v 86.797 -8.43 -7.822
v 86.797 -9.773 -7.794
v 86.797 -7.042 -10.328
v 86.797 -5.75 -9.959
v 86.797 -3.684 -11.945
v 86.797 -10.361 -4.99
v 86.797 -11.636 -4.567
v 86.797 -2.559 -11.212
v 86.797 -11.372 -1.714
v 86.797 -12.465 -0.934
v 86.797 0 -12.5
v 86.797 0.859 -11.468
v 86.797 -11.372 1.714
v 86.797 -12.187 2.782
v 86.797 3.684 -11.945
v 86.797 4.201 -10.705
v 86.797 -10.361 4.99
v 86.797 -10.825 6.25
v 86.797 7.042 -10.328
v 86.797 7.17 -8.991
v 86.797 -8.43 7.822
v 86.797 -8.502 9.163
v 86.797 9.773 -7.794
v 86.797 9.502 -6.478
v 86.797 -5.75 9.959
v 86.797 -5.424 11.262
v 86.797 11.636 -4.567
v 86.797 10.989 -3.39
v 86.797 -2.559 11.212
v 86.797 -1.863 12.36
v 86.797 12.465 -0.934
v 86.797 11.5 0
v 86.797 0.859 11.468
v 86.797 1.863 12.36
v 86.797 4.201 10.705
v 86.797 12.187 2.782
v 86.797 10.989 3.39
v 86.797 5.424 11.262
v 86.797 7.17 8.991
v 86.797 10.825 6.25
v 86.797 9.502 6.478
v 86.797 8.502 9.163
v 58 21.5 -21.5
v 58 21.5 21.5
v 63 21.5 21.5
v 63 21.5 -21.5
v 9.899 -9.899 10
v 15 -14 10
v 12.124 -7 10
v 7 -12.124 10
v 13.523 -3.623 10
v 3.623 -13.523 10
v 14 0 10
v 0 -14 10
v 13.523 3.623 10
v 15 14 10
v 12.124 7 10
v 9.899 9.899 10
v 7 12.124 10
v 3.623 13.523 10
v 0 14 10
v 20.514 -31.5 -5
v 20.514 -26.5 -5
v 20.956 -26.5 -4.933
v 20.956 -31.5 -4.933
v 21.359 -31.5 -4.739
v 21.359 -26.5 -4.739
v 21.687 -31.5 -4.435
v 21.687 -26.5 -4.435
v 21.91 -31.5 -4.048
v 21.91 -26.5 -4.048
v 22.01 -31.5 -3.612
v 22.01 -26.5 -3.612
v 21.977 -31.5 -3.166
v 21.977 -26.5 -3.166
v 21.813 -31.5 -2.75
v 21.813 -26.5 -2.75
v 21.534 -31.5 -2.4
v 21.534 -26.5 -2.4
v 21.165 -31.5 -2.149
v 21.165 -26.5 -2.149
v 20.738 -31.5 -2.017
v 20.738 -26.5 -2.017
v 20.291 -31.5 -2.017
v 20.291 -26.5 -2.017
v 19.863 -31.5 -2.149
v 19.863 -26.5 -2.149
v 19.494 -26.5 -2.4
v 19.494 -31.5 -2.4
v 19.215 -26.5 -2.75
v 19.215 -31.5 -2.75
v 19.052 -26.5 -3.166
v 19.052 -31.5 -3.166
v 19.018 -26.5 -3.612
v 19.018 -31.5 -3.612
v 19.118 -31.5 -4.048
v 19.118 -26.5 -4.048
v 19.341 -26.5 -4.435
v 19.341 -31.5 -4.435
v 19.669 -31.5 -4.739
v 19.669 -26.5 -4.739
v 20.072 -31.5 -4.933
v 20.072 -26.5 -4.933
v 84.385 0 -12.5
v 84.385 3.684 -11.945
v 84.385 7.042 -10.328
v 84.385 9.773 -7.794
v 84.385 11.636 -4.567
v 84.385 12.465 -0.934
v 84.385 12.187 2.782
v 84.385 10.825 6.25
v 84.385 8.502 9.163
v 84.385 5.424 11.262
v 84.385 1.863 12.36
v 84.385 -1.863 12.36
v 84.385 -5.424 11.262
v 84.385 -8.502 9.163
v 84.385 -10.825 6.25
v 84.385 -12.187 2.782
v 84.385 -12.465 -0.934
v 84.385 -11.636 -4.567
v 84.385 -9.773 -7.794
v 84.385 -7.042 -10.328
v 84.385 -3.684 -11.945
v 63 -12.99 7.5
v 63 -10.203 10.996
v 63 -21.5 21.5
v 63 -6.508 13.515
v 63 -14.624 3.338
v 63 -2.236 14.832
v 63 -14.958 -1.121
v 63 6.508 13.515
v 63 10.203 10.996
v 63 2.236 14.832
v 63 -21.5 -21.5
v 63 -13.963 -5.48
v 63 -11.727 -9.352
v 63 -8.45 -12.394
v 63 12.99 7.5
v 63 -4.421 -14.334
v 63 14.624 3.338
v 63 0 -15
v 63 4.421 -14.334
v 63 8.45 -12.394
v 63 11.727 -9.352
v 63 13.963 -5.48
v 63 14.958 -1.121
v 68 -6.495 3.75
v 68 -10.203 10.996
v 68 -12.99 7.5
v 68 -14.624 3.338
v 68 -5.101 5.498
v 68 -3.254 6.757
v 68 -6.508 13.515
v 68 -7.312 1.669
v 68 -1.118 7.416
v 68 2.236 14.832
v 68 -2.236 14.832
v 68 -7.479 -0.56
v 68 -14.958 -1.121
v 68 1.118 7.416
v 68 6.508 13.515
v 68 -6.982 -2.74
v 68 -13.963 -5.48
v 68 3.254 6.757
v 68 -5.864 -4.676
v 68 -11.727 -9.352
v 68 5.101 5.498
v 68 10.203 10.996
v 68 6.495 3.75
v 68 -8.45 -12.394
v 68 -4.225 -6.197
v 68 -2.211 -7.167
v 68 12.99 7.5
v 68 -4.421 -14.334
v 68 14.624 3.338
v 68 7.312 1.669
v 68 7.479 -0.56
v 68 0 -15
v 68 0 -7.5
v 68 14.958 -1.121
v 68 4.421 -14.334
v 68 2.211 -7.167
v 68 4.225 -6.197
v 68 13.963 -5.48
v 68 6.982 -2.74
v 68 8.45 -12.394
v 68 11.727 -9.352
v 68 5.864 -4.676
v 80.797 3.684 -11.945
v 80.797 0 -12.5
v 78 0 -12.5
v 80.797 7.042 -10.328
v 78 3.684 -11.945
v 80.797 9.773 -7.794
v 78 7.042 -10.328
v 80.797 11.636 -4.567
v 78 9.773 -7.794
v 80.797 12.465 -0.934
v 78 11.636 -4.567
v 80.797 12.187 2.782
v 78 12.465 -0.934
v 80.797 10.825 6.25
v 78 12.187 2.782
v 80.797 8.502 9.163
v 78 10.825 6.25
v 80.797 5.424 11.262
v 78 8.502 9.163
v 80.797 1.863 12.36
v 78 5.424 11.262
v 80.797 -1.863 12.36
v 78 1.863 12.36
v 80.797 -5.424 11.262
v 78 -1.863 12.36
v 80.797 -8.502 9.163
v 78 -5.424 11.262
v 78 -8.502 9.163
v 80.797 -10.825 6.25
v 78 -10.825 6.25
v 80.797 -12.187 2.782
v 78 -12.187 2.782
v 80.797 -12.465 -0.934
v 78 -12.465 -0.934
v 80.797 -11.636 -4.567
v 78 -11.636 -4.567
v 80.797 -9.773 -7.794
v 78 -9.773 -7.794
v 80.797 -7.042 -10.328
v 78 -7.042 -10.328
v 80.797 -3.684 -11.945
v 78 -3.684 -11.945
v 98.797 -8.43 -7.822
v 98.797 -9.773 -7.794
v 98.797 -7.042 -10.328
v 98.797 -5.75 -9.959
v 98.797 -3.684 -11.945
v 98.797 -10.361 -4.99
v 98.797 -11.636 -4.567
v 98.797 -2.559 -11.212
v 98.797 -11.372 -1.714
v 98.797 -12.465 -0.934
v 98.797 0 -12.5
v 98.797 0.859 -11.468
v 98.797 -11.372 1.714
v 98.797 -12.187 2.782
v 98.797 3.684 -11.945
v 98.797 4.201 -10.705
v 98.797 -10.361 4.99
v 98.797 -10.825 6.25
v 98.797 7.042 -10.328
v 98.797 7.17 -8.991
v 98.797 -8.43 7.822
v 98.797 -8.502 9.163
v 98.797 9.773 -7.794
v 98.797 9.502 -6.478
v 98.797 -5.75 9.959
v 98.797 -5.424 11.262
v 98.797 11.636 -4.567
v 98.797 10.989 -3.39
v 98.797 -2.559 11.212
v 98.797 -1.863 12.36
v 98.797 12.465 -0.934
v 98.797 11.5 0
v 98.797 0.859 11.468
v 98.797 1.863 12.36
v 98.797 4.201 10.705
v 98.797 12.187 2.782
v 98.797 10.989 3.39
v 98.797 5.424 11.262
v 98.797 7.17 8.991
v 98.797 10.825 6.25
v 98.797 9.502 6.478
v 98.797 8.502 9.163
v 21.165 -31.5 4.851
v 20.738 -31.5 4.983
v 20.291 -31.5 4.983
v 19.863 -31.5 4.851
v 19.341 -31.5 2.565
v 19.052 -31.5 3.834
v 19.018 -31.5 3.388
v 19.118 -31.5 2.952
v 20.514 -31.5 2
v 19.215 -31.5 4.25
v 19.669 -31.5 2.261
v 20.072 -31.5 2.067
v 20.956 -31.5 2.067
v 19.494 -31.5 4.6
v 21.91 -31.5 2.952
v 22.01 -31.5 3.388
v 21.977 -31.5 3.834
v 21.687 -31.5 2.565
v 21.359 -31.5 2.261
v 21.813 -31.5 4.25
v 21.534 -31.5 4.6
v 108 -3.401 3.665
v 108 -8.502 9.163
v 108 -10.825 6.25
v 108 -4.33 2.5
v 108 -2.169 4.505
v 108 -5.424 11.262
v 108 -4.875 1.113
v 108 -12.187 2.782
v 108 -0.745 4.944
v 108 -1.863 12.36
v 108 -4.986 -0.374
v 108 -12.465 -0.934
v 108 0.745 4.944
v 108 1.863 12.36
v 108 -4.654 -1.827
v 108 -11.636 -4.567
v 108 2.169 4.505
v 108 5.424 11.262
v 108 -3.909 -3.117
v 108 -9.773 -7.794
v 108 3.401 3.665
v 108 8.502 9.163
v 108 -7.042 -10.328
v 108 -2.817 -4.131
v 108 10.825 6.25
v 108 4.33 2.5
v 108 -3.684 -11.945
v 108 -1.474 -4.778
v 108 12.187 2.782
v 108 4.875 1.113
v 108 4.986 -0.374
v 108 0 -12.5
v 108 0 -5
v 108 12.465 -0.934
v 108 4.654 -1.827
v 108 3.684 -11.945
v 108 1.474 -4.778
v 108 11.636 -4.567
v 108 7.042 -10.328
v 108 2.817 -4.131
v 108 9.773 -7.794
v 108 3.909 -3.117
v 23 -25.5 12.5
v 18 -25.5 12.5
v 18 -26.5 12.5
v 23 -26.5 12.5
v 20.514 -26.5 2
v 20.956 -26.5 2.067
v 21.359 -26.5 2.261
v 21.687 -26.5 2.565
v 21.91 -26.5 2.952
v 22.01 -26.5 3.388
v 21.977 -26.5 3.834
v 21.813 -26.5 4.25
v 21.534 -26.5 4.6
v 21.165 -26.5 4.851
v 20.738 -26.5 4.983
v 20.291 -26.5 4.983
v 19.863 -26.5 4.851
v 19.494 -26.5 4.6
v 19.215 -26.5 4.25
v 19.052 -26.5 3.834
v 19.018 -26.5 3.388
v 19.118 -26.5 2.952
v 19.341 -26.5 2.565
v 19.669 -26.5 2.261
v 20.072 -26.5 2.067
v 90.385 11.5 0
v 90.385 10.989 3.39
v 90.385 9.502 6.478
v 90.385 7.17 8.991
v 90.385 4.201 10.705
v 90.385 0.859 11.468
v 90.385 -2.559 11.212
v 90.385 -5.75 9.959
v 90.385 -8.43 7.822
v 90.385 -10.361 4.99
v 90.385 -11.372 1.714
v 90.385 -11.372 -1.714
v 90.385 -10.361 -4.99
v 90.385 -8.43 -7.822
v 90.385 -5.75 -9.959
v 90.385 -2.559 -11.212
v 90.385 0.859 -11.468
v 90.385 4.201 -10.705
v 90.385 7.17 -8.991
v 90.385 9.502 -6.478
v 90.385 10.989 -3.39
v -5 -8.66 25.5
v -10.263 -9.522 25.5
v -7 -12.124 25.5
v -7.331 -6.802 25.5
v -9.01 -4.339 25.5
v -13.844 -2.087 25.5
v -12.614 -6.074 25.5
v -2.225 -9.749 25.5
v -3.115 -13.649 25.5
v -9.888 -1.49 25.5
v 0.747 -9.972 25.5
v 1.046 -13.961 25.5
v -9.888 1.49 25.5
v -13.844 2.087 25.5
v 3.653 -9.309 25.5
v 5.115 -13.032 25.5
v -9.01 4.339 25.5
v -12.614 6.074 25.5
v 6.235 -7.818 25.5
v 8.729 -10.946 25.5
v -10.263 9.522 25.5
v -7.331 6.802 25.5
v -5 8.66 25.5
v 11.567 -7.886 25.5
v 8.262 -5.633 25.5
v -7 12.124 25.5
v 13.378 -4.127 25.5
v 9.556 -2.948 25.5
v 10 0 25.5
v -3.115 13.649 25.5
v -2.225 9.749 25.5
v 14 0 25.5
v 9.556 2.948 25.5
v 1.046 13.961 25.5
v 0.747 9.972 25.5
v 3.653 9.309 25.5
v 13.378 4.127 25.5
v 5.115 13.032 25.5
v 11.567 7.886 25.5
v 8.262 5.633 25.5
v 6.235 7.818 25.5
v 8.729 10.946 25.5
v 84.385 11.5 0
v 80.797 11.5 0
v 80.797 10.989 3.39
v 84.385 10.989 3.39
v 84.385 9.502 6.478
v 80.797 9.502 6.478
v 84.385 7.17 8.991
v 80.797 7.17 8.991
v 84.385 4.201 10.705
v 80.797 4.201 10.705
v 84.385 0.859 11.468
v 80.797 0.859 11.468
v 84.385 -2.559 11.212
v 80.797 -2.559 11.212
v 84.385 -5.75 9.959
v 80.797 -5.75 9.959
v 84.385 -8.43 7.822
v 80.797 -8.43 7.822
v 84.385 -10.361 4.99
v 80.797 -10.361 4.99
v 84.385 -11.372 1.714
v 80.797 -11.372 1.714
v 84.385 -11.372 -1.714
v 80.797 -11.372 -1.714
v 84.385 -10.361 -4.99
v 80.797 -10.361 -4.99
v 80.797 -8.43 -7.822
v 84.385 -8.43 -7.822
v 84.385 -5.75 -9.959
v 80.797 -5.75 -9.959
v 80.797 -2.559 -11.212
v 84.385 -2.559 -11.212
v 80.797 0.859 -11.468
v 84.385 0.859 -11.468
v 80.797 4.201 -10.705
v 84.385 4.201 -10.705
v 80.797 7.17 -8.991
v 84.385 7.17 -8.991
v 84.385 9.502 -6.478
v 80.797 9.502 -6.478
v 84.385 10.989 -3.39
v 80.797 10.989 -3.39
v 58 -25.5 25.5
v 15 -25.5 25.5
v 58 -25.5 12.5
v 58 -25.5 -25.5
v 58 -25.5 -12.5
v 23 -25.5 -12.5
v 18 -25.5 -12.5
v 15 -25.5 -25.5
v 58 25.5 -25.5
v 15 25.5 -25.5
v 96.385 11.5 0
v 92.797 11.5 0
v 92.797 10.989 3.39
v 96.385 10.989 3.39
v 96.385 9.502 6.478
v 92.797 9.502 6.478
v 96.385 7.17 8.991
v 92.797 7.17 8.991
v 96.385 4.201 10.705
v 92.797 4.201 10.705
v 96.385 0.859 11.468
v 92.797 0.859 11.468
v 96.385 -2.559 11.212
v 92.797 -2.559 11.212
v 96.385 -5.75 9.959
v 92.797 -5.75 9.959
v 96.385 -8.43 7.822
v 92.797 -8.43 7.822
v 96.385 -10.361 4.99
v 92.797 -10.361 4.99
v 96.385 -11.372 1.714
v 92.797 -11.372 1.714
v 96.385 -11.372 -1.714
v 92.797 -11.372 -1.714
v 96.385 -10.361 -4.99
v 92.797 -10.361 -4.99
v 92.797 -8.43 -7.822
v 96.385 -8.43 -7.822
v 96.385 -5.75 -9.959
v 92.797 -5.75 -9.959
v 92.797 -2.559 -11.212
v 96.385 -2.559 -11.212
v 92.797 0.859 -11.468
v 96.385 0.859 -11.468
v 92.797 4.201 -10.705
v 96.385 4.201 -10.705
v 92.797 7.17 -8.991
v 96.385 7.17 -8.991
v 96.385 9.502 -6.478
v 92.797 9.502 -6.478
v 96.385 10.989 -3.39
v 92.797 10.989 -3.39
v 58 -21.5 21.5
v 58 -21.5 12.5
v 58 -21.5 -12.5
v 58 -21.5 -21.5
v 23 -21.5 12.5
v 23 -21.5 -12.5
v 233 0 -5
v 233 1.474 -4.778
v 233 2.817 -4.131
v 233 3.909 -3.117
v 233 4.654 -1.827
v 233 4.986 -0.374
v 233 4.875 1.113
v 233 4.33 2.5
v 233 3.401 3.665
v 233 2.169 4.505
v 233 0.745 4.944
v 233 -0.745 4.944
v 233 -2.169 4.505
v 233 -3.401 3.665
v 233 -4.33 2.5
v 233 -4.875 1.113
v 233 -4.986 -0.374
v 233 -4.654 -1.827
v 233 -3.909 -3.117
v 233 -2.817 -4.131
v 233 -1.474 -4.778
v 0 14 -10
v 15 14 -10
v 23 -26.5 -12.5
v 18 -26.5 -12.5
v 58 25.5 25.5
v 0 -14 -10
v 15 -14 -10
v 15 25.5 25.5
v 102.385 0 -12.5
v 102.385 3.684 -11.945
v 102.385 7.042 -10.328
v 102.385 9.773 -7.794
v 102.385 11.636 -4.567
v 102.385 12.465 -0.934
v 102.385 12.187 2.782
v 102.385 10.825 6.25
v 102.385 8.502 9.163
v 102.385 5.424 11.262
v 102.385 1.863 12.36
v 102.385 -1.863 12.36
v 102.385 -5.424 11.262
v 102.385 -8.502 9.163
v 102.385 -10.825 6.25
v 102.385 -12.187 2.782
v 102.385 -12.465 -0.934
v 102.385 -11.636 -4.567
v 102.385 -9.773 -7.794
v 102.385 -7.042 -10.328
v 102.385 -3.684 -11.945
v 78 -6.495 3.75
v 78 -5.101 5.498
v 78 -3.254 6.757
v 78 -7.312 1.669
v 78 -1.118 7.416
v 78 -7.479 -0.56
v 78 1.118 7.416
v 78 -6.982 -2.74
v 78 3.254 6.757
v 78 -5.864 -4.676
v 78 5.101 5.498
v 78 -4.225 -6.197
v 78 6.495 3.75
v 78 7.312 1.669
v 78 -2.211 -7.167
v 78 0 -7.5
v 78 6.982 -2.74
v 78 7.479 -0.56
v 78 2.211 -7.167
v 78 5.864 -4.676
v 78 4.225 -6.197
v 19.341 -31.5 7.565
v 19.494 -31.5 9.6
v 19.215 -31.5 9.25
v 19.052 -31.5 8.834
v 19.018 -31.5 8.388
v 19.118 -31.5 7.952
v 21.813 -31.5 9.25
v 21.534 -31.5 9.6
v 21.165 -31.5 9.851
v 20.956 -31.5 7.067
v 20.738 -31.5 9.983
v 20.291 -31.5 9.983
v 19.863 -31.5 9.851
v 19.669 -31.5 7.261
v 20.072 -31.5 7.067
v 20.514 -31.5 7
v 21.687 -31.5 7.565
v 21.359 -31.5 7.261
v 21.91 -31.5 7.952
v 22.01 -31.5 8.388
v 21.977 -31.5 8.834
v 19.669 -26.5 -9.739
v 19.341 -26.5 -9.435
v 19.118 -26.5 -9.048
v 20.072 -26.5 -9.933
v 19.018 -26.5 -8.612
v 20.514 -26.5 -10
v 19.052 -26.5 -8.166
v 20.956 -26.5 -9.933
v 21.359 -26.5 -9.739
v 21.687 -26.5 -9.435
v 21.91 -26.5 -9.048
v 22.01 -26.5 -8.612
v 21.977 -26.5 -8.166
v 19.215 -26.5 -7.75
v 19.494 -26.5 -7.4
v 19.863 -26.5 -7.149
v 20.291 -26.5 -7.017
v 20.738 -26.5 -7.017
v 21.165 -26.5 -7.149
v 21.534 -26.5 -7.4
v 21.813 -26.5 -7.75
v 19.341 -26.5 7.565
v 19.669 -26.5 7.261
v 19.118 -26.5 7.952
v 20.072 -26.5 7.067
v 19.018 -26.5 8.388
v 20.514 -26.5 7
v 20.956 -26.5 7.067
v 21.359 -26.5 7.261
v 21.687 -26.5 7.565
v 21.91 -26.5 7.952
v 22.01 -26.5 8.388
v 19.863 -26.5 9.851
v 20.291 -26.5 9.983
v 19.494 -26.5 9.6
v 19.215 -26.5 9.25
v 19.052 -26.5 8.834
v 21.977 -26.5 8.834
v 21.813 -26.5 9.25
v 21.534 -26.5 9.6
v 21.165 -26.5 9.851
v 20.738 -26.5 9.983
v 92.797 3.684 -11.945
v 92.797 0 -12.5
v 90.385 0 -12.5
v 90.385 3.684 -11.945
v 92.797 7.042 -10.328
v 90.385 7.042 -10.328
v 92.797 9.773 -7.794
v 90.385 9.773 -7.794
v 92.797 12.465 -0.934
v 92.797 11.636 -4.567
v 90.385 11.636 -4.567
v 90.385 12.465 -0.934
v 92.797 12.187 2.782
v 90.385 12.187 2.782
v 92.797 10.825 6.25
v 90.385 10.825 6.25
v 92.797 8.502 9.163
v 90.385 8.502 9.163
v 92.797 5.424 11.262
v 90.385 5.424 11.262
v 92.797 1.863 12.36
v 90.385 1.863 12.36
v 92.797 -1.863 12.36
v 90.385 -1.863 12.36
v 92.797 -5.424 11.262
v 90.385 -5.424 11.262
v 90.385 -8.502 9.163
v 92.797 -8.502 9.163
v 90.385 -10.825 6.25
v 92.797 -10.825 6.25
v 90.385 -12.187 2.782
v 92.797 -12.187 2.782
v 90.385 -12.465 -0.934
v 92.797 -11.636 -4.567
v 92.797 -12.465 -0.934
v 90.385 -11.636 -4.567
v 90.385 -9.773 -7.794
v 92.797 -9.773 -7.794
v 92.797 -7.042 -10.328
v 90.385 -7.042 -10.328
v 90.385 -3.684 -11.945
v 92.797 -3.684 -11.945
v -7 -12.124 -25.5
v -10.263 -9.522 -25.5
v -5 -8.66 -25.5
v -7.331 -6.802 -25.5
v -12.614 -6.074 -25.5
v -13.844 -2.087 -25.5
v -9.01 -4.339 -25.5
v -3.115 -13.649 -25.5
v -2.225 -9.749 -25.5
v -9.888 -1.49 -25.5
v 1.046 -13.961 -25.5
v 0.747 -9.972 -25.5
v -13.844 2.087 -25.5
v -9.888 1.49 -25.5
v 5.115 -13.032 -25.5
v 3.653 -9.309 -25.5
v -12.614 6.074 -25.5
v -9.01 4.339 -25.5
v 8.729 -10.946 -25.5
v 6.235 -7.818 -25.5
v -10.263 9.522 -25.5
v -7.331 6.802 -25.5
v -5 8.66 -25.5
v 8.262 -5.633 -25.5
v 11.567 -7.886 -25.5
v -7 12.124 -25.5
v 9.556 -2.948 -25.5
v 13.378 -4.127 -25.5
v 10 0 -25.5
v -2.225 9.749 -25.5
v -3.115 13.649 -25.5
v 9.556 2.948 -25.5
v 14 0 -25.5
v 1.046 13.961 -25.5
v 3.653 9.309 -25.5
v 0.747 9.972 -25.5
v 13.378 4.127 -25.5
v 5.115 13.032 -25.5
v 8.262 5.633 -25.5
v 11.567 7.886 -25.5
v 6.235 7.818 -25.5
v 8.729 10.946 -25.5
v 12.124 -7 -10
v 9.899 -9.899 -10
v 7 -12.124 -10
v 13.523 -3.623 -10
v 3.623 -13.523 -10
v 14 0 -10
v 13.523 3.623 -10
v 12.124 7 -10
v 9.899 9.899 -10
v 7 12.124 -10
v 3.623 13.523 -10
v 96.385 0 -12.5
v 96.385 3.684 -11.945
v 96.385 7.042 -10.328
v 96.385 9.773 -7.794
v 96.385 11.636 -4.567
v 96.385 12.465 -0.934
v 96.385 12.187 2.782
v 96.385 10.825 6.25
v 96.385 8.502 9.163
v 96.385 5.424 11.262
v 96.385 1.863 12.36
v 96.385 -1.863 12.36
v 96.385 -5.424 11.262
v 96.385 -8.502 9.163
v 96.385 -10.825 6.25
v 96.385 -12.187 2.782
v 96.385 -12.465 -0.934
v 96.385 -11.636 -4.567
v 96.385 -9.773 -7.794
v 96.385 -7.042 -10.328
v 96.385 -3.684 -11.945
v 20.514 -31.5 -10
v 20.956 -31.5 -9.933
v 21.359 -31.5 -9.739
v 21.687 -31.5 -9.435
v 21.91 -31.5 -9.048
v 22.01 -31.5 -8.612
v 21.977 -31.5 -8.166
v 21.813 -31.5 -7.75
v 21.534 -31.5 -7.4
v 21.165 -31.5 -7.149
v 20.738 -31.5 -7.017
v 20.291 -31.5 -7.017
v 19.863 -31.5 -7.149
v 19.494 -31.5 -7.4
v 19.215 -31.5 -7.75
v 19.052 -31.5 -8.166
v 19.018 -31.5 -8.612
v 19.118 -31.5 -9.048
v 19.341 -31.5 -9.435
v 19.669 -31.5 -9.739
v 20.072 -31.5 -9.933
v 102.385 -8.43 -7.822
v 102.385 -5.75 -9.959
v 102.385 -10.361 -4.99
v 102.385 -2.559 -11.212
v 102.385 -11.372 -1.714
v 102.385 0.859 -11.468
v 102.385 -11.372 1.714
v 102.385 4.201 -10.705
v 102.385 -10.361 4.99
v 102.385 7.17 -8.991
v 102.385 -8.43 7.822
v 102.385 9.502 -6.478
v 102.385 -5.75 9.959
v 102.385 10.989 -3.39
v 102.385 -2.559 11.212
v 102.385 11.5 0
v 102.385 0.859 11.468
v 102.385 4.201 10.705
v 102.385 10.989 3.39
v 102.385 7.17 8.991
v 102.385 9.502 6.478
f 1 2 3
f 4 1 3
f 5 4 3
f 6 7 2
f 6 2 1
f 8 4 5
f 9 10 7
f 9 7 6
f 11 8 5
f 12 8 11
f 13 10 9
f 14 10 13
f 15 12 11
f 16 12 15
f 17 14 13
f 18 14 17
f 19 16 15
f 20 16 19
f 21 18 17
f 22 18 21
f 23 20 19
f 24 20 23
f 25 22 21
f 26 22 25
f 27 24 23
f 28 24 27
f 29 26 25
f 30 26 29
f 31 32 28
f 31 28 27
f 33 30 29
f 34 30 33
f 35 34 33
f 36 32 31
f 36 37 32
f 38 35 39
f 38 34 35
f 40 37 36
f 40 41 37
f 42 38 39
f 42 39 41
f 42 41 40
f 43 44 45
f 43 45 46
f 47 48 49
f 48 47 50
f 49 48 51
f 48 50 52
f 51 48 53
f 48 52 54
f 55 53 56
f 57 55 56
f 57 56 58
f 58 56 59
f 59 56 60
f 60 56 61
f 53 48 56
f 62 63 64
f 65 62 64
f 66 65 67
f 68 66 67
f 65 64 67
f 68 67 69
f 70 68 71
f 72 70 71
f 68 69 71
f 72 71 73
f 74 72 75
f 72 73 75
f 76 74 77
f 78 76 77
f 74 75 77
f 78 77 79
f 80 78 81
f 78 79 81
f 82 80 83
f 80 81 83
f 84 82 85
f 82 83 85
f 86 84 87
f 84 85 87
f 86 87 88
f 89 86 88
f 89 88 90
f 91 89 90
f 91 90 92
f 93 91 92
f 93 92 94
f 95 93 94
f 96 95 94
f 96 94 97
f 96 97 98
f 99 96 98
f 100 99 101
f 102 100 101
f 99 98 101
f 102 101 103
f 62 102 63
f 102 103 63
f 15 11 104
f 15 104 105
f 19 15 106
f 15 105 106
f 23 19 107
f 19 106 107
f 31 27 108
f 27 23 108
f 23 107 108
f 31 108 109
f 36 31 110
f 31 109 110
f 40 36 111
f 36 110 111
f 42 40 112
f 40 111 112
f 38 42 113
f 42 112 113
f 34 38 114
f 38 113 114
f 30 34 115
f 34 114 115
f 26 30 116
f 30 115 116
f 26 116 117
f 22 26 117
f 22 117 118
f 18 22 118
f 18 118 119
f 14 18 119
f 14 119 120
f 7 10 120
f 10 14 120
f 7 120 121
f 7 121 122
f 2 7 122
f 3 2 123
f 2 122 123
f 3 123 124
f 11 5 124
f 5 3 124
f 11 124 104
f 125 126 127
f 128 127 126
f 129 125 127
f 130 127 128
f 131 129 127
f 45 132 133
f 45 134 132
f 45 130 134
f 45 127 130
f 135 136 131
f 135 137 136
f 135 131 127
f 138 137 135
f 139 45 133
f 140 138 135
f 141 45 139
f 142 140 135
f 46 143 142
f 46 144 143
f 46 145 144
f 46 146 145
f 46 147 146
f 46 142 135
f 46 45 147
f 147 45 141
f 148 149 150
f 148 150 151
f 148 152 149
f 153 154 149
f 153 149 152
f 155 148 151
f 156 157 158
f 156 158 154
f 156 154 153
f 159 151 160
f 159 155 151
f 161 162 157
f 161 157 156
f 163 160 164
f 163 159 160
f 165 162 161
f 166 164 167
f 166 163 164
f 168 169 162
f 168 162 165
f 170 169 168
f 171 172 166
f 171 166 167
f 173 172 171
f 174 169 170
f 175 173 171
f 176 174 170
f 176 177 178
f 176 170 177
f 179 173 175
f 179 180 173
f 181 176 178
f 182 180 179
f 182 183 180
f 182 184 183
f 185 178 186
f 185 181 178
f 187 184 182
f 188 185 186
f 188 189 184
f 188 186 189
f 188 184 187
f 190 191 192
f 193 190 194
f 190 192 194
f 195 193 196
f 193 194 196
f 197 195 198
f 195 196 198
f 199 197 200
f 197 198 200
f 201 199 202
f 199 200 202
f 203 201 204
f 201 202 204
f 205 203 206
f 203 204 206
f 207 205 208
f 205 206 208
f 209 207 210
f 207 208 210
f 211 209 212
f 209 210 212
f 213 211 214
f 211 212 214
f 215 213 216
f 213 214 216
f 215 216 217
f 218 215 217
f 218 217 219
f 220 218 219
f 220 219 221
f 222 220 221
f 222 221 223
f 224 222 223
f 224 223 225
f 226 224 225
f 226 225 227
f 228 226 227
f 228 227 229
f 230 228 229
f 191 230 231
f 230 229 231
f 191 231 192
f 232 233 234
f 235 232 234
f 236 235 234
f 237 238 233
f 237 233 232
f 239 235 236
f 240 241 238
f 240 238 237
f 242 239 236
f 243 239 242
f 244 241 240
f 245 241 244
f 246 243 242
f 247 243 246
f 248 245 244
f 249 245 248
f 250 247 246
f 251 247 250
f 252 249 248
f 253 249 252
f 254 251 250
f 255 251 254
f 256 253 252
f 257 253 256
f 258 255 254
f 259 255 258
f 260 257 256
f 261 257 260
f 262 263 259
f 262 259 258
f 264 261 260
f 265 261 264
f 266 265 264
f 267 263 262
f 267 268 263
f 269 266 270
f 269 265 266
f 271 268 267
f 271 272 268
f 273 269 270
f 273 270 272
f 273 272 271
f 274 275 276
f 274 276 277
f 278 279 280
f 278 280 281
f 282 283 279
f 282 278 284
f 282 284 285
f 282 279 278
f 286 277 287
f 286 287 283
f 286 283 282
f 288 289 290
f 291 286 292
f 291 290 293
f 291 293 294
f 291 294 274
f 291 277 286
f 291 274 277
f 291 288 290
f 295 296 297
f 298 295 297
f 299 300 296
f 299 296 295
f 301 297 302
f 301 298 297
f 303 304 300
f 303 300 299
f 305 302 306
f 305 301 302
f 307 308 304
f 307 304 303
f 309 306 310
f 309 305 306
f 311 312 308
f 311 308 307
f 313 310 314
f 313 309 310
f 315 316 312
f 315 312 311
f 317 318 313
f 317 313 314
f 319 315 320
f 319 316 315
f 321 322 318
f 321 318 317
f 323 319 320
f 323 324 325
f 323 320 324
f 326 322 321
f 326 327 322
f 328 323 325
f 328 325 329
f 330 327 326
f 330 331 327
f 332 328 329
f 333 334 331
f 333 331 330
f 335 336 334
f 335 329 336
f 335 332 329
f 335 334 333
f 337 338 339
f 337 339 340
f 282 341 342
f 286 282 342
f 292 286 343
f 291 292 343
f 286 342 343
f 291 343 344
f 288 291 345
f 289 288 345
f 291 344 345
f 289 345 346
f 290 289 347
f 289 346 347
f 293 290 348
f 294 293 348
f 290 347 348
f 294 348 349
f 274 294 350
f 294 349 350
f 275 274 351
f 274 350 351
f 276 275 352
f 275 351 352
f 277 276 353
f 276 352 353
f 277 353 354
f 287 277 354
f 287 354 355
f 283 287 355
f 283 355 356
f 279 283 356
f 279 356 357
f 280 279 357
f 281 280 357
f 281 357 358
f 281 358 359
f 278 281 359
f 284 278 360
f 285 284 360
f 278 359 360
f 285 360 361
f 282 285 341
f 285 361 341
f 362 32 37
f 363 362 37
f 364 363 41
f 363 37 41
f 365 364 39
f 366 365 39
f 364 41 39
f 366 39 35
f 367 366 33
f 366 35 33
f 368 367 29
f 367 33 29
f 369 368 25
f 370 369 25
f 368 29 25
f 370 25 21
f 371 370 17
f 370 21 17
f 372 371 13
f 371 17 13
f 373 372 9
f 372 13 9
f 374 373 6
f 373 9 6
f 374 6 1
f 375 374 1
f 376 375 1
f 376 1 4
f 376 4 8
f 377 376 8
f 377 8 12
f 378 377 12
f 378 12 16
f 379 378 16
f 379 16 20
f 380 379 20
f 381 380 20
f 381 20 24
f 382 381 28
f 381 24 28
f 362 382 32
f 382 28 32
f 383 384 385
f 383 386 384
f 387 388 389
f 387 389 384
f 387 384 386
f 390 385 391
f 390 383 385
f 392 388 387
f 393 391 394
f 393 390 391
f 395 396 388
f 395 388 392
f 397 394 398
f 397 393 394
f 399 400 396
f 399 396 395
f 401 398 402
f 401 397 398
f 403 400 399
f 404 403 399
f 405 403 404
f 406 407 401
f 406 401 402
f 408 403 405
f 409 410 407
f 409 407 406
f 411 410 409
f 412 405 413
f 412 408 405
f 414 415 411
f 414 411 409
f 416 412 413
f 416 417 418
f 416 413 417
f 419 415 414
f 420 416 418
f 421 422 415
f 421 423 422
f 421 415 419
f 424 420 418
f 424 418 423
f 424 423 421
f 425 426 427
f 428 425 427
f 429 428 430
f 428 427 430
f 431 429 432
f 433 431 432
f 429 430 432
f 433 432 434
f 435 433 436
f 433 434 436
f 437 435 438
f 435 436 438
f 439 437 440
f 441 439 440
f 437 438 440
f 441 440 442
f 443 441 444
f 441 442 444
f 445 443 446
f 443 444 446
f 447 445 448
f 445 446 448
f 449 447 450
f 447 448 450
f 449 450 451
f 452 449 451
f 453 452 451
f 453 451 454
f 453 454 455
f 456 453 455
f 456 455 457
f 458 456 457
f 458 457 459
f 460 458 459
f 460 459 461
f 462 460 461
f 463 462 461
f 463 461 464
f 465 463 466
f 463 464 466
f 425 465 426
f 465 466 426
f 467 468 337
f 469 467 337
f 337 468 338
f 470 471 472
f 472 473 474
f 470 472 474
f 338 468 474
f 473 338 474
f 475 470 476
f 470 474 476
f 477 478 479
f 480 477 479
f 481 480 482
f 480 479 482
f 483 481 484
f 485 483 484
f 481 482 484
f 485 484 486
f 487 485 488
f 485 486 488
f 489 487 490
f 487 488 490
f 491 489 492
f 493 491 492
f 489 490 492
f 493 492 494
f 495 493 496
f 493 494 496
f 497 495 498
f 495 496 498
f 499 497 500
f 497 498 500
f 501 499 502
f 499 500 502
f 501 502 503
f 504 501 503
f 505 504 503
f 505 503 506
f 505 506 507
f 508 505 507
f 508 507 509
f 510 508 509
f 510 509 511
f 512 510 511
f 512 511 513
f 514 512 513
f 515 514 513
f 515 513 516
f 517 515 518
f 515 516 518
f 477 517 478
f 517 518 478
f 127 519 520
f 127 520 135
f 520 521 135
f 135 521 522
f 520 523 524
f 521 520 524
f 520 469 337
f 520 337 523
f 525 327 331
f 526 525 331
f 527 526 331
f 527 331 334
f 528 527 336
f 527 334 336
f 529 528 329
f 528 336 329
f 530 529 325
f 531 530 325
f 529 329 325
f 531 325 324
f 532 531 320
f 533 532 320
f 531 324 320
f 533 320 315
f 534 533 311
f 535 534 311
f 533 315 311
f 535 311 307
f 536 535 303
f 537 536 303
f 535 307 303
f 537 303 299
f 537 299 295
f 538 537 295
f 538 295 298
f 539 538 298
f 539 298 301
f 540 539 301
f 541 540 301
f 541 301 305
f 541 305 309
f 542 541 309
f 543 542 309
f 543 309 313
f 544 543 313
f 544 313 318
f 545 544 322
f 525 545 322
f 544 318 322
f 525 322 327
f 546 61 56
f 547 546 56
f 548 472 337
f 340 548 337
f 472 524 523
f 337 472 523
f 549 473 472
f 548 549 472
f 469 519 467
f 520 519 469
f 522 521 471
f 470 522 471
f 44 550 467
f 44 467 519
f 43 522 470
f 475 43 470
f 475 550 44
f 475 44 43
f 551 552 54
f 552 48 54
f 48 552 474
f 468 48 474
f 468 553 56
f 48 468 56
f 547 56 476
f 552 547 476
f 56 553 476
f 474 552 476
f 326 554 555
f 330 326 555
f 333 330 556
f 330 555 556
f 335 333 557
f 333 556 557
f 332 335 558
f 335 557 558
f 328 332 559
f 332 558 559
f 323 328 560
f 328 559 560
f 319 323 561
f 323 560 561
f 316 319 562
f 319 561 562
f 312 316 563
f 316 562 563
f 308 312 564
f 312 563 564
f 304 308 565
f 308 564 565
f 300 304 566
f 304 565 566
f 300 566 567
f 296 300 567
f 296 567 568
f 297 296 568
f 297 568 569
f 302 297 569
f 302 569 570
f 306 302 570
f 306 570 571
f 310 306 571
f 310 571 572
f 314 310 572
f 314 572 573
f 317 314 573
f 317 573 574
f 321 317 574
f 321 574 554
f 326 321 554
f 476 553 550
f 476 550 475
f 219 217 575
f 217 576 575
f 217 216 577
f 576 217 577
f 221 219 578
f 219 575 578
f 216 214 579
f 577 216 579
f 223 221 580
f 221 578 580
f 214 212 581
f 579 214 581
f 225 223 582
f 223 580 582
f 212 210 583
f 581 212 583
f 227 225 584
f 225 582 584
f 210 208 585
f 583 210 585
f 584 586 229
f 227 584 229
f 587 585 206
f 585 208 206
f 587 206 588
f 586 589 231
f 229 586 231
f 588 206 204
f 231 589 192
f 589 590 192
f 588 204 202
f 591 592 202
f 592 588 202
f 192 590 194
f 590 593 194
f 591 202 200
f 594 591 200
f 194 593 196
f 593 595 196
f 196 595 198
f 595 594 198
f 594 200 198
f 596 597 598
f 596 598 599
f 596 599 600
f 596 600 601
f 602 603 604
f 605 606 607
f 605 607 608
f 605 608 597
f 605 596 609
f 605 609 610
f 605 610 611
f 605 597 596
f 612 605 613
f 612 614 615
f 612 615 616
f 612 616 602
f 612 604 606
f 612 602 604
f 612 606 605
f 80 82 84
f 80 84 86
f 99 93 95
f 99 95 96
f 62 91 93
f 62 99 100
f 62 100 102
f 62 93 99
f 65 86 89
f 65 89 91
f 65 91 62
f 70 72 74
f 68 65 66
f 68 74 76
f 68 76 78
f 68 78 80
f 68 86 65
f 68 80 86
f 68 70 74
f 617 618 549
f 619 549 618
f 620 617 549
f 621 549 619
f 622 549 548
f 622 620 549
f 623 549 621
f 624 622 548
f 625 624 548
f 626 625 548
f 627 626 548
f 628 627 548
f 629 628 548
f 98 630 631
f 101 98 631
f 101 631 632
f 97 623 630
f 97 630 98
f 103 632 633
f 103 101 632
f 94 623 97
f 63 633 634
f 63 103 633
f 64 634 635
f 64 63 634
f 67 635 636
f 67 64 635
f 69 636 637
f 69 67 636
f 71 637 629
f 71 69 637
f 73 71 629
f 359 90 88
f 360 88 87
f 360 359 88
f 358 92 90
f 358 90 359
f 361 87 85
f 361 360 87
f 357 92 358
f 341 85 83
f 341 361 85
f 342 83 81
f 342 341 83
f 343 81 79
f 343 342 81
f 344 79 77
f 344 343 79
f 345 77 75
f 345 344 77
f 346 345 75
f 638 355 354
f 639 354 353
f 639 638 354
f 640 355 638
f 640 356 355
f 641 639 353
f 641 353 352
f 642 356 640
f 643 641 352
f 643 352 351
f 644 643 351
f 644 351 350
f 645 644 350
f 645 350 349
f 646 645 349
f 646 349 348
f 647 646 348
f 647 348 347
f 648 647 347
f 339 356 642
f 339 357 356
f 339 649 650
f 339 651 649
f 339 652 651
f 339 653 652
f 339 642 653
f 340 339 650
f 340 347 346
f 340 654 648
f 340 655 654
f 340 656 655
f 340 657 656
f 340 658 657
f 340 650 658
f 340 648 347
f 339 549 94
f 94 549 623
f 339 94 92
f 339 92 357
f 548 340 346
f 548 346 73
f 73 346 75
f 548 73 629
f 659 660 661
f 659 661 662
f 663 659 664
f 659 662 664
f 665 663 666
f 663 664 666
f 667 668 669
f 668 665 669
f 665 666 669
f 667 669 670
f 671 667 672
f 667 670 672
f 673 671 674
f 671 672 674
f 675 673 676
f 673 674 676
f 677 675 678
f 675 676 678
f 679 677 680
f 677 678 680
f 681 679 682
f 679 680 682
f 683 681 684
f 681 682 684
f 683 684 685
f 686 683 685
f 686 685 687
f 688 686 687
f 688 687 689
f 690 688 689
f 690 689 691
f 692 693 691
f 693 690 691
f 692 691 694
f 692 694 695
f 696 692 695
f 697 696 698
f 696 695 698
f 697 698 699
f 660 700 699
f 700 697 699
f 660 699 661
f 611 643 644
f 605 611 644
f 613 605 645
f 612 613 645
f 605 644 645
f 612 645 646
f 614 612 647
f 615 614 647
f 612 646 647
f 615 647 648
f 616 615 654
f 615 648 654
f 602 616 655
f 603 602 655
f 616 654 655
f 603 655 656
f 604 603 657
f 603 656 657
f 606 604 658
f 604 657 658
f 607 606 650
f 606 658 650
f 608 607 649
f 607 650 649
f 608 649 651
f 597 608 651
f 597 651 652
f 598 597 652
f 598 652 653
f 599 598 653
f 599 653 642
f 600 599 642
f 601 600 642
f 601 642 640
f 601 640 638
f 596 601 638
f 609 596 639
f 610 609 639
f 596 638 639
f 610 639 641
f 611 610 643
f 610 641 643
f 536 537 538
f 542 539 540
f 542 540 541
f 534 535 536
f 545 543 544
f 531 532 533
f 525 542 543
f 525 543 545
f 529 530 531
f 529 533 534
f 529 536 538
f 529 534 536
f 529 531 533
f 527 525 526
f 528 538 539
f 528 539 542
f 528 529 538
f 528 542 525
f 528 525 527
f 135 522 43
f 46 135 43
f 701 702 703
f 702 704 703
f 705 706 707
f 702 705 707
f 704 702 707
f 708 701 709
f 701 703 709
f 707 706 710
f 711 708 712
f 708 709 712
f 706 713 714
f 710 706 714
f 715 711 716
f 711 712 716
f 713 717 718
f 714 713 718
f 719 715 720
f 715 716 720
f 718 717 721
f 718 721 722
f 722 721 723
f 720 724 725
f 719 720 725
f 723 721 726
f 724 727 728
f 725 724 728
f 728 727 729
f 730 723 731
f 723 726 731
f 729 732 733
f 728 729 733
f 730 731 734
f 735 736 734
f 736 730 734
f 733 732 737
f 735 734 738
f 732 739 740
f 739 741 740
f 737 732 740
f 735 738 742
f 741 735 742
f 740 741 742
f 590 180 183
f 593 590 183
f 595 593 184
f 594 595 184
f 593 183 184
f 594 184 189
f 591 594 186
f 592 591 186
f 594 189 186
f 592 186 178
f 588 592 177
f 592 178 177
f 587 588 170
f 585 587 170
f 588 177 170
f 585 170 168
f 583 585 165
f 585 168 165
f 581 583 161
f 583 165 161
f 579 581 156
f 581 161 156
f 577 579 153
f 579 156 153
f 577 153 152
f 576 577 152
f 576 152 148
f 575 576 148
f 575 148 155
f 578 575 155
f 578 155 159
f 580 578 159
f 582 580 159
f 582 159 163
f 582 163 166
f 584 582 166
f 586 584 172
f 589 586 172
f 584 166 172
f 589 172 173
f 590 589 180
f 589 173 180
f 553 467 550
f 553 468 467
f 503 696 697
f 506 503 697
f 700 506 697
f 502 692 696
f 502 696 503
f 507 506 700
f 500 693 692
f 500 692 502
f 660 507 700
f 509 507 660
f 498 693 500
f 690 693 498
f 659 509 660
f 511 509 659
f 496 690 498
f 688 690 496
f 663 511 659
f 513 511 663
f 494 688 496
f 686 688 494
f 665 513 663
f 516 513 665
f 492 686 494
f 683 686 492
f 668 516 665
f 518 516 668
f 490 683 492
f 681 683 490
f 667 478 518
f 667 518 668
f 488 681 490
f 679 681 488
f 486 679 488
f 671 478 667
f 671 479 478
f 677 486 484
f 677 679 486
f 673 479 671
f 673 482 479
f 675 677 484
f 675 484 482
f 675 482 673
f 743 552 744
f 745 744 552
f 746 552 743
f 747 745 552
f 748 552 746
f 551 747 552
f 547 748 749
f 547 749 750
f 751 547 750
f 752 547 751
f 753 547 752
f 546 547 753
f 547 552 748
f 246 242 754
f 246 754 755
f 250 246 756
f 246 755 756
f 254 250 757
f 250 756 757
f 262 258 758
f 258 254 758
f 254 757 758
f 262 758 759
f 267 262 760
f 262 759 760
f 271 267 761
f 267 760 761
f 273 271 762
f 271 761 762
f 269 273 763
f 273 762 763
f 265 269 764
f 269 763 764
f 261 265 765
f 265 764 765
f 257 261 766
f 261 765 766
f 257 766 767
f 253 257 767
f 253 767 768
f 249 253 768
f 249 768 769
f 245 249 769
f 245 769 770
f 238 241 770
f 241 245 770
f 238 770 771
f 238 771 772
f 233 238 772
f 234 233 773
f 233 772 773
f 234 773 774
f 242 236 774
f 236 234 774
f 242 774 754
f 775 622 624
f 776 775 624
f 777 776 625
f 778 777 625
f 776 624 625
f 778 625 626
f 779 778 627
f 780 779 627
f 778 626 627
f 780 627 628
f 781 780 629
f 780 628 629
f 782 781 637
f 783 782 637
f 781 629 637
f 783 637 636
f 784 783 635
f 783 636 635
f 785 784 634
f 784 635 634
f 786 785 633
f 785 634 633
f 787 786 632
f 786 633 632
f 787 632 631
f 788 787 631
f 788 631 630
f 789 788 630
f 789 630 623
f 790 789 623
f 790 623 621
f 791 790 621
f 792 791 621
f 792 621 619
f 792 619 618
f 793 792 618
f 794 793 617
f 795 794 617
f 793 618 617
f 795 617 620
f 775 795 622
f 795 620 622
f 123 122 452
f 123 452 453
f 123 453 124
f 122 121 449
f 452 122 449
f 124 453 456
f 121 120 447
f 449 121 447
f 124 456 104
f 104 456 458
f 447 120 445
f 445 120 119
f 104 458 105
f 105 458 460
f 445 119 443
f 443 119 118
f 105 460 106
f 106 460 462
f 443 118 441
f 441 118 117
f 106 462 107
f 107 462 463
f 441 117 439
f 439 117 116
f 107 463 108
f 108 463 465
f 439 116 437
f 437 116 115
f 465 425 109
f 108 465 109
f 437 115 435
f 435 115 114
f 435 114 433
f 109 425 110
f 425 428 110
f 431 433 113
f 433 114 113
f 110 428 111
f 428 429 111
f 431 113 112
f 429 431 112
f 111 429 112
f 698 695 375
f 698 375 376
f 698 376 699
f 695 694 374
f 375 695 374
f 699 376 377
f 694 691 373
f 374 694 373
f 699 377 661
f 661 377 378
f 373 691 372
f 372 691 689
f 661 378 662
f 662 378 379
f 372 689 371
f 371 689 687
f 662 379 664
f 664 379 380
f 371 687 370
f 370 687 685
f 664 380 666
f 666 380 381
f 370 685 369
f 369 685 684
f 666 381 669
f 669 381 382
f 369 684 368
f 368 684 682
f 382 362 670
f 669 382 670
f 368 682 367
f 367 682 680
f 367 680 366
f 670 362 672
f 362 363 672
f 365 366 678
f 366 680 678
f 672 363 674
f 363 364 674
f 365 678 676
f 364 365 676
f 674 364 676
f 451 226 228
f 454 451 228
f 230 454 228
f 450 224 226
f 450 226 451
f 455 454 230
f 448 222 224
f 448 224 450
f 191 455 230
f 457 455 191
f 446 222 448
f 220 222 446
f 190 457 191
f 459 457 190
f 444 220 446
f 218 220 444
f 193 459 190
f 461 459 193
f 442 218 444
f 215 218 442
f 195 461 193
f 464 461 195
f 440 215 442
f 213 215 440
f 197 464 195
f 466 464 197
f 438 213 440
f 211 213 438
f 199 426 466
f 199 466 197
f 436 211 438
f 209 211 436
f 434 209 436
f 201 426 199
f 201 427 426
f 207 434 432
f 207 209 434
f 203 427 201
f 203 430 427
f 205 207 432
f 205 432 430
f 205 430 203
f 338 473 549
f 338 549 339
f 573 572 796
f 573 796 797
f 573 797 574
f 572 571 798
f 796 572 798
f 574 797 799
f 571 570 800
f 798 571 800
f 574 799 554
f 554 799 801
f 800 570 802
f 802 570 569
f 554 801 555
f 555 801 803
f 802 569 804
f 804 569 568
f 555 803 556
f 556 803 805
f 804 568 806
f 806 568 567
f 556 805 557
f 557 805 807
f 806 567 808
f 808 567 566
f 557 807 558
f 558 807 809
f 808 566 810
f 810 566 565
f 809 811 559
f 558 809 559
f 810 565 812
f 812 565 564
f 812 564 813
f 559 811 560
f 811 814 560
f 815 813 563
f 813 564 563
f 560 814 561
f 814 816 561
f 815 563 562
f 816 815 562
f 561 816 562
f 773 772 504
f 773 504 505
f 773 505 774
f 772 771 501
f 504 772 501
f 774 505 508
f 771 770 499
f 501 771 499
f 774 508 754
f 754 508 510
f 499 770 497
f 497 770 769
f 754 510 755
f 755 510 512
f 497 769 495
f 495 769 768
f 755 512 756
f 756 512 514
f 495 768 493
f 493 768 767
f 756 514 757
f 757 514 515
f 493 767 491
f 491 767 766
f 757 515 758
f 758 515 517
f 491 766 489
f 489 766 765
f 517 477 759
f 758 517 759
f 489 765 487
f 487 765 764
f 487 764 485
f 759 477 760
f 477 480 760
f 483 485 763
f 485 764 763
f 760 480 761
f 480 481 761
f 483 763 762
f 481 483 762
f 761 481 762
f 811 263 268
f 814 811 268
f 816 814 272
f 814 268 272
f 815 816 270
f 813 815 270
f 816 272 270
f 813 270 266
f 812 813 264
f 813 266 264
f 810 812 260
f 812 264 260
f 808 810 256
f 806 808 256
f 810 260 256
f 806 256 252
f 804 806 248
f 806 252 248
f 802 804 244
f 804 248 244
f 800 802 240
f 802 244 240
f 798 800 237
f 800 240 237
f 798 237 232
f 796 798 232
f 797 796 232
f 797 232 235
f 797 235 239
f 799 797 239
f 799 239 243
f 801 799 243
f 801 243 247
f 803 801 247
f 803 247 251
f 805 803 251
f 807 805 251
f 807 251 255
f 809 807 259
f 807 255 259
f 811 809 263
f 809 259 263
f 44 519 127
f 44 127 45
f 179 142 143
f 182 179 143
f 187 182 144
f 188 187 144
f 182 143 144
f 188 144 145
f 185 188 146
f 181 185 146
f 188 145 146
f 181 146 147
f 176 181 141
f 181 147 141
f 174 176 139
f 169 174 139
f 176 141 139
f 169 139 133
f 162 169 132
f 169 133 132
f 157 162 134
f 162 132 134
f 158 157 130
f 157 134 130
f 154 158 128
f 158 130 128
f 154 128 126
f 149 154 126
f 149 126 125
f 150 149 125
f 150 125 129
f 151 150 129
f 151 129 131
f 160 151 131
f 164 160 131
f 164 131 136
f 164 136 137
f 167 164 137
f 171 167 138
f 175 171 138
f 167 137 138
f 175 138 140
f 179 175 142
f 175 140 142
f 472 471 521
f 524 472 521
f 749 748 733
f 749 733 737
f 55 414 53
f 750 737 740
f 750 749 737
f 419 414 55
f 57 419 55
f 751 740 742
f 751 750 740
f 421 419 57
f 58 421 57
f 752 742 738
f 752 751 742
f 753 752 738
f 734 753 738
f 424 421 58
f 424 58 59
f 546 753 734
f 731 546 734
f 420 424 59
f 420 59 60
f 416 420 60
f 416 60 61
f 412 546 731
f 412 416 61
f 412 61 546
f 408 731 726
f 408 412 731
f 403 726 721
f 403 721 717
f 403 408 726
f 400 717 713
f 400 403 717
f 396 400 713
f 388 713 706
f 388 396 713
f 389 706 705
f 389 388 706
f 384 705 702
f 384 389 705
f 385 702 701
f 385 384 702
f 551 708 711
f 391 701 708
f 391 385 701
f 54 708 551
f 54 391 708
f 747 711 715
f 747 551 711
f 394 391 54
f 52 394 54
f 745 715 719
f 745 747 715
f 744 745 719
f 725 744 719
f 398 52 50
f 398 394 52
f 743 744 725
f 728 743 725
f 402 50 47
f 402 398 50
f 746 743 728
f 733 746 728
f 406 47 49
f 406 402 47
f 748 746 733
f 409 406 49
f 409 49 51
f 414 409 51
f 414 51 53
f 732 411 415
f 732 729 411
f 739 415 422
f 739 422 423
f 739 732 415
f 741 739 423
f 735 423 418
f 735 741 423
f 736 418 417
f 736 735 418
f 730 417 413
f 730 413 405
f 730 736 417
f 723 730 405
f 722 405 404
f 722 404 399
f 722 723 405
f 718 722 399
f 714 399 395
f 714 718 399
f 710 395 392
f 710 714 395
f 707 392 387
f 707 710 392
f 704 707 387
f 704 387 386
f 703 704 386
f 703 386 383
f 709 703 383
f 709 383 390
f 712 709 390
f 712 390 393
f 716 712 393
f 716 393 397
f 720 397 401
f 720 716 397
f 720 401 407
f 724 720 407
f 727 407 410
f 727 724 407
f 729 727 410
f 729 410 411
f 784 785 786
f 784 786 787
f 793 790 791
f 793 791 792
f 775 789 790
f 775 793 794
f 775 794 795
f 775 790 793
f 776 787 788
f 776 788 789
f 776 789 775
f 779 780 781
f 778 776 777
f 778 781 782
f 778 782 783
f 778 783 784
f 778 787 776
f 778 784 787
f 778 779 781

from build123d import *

# Parameters (mm, degrees)
SKETCH2_R               = 14
SKETCH2_R_2             = 10
EXTRUDE1_DEPTH          = 25.5
EXTRUDE2_DEPTH          = 10
SKETCH4_W               = 51
SKETCH4_H               = 51
EXTRUDE3_DEPTH          = 3
SKETCH5_W               = 51
SKETCH5_H               = 51
SKETCH5_W_2             = 43
SKETCH5_H_2             = 43
EXTRUDE4_DEPTH          = 40
SKETCH8_W               = 25
SKETCH8_H               = 20
EXTRUDE8_DEPTH          = 40
SKETCH10_W              = 43
SKETCH10_H              = 43
EXTRUDE10_DEPTH         = 45
SKETCH11_R              = 15
EXTRUDE11_DEPTH         = 5
SKETCH12_W              = 5
SKETCH12_H              = 25
EXTRUDE12_DEPTH         = 5
SKETCH13_R              = 1.5
EXTRUDE13_DEPTH         = 5
SKETCH14_R              = 7.5
EXTRUDE14_DEPTH         = 10
SKETCH15_R              = 12.5
EXTRUDE15_DEPTH         = 30
SKETCH16_R              = 5
EXTRUDE16_DEPTH         = 125
EXTRUDE17_START         = 80.797218397
EXTRUDE17_OUTLINE_R     = 12.5
EXTRUDE17_OUTLINE_R_2   = 11.5
EXTRUDE17_DEPTH         = 3.587847701
EXTRUDE17_START_2       = 86.797218397
EXTRUDE17_2_OUTLINE_R   = 12.5
EXTRUDE17_2_OUTLINE_R_2 = 11.5
EXTRUDE17_2_DEPTH       = 3.587847701
EXTRUDE17_START_3       = 92.797218397
EXTRUDE17_3_OUTLINE_R   = 12.5
EXTRUDE17_3_OUTLINE_R_2 = 11.5
EXTRUDE17_3_DEPTH       = 3.587847701
EXTRUDE17_START_4       = 98.797218397
EXTRUDE17_4_OUTLINE_R   = 12.5
EXTRUDE17_4_OUTLINE_R_2 = 11.5
EXTRUDE17_4_DEPTH       = 3.587847701


# Read off the part's stored shape, not the designer's step: Extrude17
with BuildPart() as part:
    # Sketch2 → Extrude1 (new, symmetric)
    with BuildSketch(Plane.XY):
        Circle(SKETCH2_R)
        Circle(SKETCH2_R_2, mode=Mode.SUBTRACT)
    extrude(amount=EXTRUDE1_DEPTH, both=True)

    # Sketch3 → Extrude2 (add, symmetric)
    with BuildSketch(Plane.XY):
        with BuildLine():
            Line((0, 14), (15, 14))
            Line((15, 14), (15, -14))
            Line((15, -14), (0, -14))
            ThreePointArc((0, -14), (14, 0), (0, 14))
        make_face()
    extrude(amount=EXTRUDE2_DEPTH, both=True)

    # Sketch4 → Extrude3 (add)
    with BuildSketch(Plane(origin=(15, 0, 0), x_dir=(0, 0, -1), z_dir=(1, 0, 0))):
        Rectangle(SKETCH4_W, SKETCH4_H)
    extrude(amount=EXTRUDE3_DEPTH)

    # Sketch5 → Extrude4 (add)
    with BuildSketch(Plane(origin=(18, 0, 0), x_dir=(0, 0, -1), z_dir=(1, 0, 0))):
        Rectangle(SKETCH5_W, SKETCH5_H)
        Rectangle(SKETCH5_W_2, SKETCH5_H_2, mode=Mode.SUBTRACT)
    extrude(amount=EXTRUDE4_DEPTH)

    # Sketch8 → Extrude8 (cut)
    with BuildSketch(Plane(origin=(58, 0, 0), x_dir=(0, 0, -1), z_dir=(1, 0, 0))):
        with Locations((0, -25.5)):
            Rectangle(SKETCH8_W, SKETCH8_H)
    extrude(amount=-EXTRUDE8_DEPTH, mode=Mode.SUBTRACT)

    # Sketch10 → Extrude10 (add)
    with BuildSketch(Plane(origin=(18, 0, 0), x_dir=(0, 0, -1), z_dir=(1, 0, 0))):
        Rectangle(SKETCH10_W, SKETCH10_H)
    extrude(amount=EXTRUDE10_DEPTH)

    # Sketch11 → Extrude11 (add)
    with BuildSketch(Plane(origin=(63, 0, 0), x_dir=(0, 0, -1), z_dir=(1, 0, 0))):
        Circle(SKETCH11_R)
    extrude(amount=EXTRUDE11_DEPTH)

    # Sketch12 → Extrude12 (add)
    with BuildSketch(Plane.XZ.offset(21.5)):
        with Locations((20.5, 0)):
            Rectangle(SKETCH12_W, SKETCH12_H)
    extrude(amount=EXTRUDE12_DEPTH)

    # Sketch13 → Extrude13 (add)
    with BuildSketch(Plane.XZ.offset(26.5)):
        with Locations(Location((20.514171065, 8.5, 0), (0, 0, 270))):
            Circle(SKETCH13_R)
        with Locations(Location((20.514171065, 3.5, 0), (0, 0, 270))):
            Circle(SKETCH13_R)
        with Locations(Location((20.514171065, -3.5, 0), (0, 0, 270))):
            Circle(SKETCH13_R)
        with Locations(Location((20.514171065, -8.5, 0), (0, 0, 270))):
            Circle(SKETCH13_R)
    extrude(amount=EXTRUDE13_DEPTH)

    # Sketch14 → Extrude14 (add)
    with BuildSketch(Plane(origin=(68, 0, 0), x_dir=(0, 0, -1), z_dir=(1, 0, 0))):
        Circle(SKETCH14_R)
    extrude(amount=EXTRUDE14_DEPTH)

    # Sketch15 → Extrude15 (add)
    with BuildSketch(Plane(origin=(78, 0, 0), x_dir=(0, 0, -1), z_dir=(1, 0, 0))):
        Circle(SKETCH15_R)
    extrude(amount=EXTRUDE15_DEPTH)

    # Sketch16 → Extrude16 (add)
    with BuildSketch(Plane(origin=(108, 0, 0), x_dir=(0, 0, -1), z_dir=(1, 0, 0))):
        Circle(SKETCH16_R)
    extrude(amount=EXTRUDE16_DEPTH)

    # Extrude17 outline → Extrude17 (cut)
    with BuildSketch(Plane.YZ.offset(EXTRUDE17_START)):
        Circle(EXTRUDE17_OUTLINE_R)
        Circle(EXTRUDE17_OUTLINE_R_2, mode=Mode.SUBTRACT)
    extrude(amount=EXTRUDE17_DEPTH, mode=Mode.SUBTRACT)

    # Extrude17 2 outline → Extrude17 2 (cut)
    with BuildSketch(Plane.YZ.offset(EXTRUDE17_START_2)):
        Circle(EXTRUDE17_2_OUTLINE_R)
        Circle(EXTRUDE17_2_OUTLINE_R_2, mode=Mode.SUBTRACT)
    extrude(amount=EXTRUDE17_2_DEPTH, mode=Mode.SUBTRACT)

    # Extrude17 3 outline → Extrude17 3 (cut)
    with BuildSketch(Plane.YZ.offset(EXTRUDE17_START_3)):
        Circle(EXTRUDE17_3_OUTLINE_R)
        Circle(EXTRUDE17_3_OUTLINE_R_2, mode=Mode.SUBTRACT)
    extrude(amount=EXTRUDE17_3_DEPTH, mode=Mode.SUBTRACT)

    # Extrude17 4 outline → Extrude17 4 (cut)
    with BuildSketch(Plane.YZ.offset(EXTRUDE17_START_4)):
        Circle(EXTRUDE17_4_OUTLINE_R)
        Circle(EXTRUDE17_4_OUTLINE_R_2, mode=Mode.SUBTRACT)
    extrude(amount=EXTRUDE17_4_DEPTH, mode=Mode.SUBTRACT)


solid = part.part
